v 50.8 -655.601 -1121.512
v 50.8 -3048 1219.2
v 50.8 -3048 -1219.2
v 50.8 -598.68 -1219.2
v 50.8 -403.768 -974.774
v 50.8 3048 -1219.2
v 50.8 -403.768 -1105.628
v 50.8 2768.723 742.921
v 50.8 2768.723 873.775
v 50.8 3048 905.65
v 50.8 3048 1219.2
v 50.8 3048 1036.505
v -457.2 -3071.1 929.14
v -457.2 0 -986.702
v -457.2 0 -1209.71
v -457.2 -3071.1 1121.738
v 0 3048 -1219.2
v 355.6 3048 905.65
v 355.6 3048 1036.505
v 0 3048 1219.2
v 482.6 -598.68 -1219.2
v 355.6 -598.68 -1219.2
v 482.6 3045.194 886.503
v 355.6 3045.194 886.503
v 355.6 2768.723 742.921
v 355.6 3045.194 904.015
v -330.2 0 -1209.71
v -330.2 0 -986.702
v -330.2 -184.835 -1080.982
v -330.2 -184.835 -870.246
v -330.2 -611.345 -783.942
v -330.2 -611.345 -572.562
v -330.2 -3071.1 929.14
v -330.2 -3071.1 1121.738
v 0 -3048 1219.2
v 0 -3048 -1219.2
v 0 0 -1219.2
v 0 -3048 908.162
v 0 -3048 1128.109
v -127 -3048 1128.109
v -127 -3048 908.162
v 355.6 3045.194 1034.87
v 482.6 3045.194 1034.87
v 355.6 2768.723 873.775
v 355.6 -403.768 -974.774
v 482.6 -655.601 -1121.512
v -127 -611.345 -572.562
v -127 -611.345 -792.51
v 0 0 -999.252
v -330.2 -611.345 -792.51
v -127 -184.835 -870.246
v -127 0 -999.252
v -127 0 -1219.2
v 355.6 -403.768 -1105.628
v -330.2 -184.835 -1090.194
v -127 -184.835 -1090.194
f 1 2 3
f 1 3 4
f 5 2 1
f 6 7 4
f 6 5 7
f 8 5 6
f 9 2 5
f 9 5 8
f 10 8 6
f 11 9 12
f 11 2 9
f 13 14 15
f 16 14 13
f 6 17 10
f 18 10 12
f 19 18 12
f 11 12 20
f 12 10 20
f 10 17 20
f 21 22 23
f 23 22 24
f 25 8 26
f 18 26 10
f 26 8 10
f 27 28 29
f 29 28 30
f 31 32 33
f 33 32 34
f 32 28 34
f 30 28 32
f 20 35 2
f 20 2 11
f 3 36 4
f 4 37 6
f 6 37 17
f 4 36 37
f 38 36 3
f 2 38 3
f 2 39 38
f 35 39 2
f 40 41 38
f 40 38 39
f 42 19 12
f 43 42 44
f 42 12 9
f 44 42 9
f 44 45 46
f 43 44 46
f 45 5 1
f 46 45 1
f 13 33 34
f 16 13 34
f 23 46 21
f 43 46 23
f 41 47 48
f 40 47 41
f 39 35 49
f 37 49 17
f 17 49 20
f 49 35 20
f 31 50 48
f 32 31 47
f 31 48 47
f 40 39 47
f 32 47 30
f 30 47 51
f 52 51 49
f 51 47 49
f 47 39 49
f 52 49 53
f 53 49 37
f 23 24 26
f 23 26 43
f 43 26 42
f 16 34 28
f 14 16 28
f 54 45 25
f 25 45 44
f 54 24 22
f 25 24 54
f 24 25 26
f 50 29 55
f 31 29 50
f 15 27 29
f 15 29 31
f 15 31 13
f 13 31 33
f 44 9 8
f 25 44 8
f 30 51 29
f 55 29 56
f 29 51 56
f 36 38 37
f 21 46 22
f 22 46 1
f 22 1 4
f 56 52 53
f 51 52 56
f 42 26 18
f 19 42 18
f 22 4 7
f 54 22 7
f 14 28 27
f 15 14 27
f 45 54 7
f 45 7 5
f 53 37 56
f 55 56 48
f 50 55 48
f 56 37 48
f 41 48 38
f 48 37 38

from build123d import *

# Parameters (mm, degrees)
F0_W      = 6096
F0_H      = 2438.4
F1_DEPTH  = 50.8
F3_DEPTH  = 304.8
F5_DEPTH  = 127
F7_DEPTH  = 203.2
F10_DEPTH = 127
F12_DEPTH = 127


with BuildPart() as f1:
    # F0 (on Right) → F1 (new body)
    with BuildSketch(Plane.YZ):
        Rectangle(F0_W, F0_H)
    extrude(amount=F1_DEPTH)

    # F2 (on face) → F3 (join)
    with BuildSketch(Plane.YZ.offset(50.8)):
        Polygon((2768.7226924944, 742.9208226702), (3048, 905.6503176689), (3048, 1036.5047400729), (2768.7226924944, 873.7752450741), align=None)
        Polygon((-655.6012799492, -1121.512219292), (-598.6804962158, -1219.2), (-403.7681643359, -1105.6283474403), (-403.7681643359, -974.7739250363), align=None)
    extrude(amount=F3_DEPTH)

    # F4 (on face) → F5 (join)
    with BuildSketch(Plane(origin=(0, 0, 0), x_dir=(0, -1, 0), z_dir=(-1, 0, 0))):
        Polygon((0, -1219.2), (3048, 908.1615209579), (3048, 1128.1091420174), (0, -999.2523789406), align=None)
    extrude(amount=F5_DEPTH)

    # F6 (on face) → F7 (join)
    with BuildSketch(Plane(origin=(-127, 0, 0), x_dir=(0, -1, 0), z_dir=(-1, 0, 0))):
        Polygon((611.3445986138, -572.562426468), (184.8353640356, -870.2459349899), (184.8353640356, -1090.1935560493), (611.3445986138, -792.5100475274), align=None)
    extrude(amount=F7_DEPTH)

    # F9 (on face) → F10 (join)
    with BuildSketch(Plane(origin=(-330.2, 0, 0), x_dir=(0, -1, 0), z_dir=(-1, 0, 0))):
        Polygon((184.8353640356, -870.2459349899), (184.8353640356, -1080.9821333739), (611.3445986138, -783.9422652285), (611.3445986138, -572.562426468), align=None)
        Polygon((0, -986.7016077042), (0, -1209.7096443176), (184.8353640356, -1080.9821333739), (184.8353640356, -870.2459349899), (611.3445986138, -572.562426468), (611.3445986138, -783.9422652285), (3071.0999965668, 929.1400313377), (3071.0999965668, 1121.7379570007), align=None)
    extrude(amount=F10_DEPTH)

    # F11 (on face) → F12 (join)
    with BuildSketch(Plane.YZ.offset(355.6)):
        Polygon((3045.1943140363, 1034.869921032), (-655.6012799492, -1121.512219292), (-598.6804962158, -1219.2), (3045.1943140363, 886.5033388138), align=None)
    extrude(amount=F12_DEPTH)


solid = f1.part
